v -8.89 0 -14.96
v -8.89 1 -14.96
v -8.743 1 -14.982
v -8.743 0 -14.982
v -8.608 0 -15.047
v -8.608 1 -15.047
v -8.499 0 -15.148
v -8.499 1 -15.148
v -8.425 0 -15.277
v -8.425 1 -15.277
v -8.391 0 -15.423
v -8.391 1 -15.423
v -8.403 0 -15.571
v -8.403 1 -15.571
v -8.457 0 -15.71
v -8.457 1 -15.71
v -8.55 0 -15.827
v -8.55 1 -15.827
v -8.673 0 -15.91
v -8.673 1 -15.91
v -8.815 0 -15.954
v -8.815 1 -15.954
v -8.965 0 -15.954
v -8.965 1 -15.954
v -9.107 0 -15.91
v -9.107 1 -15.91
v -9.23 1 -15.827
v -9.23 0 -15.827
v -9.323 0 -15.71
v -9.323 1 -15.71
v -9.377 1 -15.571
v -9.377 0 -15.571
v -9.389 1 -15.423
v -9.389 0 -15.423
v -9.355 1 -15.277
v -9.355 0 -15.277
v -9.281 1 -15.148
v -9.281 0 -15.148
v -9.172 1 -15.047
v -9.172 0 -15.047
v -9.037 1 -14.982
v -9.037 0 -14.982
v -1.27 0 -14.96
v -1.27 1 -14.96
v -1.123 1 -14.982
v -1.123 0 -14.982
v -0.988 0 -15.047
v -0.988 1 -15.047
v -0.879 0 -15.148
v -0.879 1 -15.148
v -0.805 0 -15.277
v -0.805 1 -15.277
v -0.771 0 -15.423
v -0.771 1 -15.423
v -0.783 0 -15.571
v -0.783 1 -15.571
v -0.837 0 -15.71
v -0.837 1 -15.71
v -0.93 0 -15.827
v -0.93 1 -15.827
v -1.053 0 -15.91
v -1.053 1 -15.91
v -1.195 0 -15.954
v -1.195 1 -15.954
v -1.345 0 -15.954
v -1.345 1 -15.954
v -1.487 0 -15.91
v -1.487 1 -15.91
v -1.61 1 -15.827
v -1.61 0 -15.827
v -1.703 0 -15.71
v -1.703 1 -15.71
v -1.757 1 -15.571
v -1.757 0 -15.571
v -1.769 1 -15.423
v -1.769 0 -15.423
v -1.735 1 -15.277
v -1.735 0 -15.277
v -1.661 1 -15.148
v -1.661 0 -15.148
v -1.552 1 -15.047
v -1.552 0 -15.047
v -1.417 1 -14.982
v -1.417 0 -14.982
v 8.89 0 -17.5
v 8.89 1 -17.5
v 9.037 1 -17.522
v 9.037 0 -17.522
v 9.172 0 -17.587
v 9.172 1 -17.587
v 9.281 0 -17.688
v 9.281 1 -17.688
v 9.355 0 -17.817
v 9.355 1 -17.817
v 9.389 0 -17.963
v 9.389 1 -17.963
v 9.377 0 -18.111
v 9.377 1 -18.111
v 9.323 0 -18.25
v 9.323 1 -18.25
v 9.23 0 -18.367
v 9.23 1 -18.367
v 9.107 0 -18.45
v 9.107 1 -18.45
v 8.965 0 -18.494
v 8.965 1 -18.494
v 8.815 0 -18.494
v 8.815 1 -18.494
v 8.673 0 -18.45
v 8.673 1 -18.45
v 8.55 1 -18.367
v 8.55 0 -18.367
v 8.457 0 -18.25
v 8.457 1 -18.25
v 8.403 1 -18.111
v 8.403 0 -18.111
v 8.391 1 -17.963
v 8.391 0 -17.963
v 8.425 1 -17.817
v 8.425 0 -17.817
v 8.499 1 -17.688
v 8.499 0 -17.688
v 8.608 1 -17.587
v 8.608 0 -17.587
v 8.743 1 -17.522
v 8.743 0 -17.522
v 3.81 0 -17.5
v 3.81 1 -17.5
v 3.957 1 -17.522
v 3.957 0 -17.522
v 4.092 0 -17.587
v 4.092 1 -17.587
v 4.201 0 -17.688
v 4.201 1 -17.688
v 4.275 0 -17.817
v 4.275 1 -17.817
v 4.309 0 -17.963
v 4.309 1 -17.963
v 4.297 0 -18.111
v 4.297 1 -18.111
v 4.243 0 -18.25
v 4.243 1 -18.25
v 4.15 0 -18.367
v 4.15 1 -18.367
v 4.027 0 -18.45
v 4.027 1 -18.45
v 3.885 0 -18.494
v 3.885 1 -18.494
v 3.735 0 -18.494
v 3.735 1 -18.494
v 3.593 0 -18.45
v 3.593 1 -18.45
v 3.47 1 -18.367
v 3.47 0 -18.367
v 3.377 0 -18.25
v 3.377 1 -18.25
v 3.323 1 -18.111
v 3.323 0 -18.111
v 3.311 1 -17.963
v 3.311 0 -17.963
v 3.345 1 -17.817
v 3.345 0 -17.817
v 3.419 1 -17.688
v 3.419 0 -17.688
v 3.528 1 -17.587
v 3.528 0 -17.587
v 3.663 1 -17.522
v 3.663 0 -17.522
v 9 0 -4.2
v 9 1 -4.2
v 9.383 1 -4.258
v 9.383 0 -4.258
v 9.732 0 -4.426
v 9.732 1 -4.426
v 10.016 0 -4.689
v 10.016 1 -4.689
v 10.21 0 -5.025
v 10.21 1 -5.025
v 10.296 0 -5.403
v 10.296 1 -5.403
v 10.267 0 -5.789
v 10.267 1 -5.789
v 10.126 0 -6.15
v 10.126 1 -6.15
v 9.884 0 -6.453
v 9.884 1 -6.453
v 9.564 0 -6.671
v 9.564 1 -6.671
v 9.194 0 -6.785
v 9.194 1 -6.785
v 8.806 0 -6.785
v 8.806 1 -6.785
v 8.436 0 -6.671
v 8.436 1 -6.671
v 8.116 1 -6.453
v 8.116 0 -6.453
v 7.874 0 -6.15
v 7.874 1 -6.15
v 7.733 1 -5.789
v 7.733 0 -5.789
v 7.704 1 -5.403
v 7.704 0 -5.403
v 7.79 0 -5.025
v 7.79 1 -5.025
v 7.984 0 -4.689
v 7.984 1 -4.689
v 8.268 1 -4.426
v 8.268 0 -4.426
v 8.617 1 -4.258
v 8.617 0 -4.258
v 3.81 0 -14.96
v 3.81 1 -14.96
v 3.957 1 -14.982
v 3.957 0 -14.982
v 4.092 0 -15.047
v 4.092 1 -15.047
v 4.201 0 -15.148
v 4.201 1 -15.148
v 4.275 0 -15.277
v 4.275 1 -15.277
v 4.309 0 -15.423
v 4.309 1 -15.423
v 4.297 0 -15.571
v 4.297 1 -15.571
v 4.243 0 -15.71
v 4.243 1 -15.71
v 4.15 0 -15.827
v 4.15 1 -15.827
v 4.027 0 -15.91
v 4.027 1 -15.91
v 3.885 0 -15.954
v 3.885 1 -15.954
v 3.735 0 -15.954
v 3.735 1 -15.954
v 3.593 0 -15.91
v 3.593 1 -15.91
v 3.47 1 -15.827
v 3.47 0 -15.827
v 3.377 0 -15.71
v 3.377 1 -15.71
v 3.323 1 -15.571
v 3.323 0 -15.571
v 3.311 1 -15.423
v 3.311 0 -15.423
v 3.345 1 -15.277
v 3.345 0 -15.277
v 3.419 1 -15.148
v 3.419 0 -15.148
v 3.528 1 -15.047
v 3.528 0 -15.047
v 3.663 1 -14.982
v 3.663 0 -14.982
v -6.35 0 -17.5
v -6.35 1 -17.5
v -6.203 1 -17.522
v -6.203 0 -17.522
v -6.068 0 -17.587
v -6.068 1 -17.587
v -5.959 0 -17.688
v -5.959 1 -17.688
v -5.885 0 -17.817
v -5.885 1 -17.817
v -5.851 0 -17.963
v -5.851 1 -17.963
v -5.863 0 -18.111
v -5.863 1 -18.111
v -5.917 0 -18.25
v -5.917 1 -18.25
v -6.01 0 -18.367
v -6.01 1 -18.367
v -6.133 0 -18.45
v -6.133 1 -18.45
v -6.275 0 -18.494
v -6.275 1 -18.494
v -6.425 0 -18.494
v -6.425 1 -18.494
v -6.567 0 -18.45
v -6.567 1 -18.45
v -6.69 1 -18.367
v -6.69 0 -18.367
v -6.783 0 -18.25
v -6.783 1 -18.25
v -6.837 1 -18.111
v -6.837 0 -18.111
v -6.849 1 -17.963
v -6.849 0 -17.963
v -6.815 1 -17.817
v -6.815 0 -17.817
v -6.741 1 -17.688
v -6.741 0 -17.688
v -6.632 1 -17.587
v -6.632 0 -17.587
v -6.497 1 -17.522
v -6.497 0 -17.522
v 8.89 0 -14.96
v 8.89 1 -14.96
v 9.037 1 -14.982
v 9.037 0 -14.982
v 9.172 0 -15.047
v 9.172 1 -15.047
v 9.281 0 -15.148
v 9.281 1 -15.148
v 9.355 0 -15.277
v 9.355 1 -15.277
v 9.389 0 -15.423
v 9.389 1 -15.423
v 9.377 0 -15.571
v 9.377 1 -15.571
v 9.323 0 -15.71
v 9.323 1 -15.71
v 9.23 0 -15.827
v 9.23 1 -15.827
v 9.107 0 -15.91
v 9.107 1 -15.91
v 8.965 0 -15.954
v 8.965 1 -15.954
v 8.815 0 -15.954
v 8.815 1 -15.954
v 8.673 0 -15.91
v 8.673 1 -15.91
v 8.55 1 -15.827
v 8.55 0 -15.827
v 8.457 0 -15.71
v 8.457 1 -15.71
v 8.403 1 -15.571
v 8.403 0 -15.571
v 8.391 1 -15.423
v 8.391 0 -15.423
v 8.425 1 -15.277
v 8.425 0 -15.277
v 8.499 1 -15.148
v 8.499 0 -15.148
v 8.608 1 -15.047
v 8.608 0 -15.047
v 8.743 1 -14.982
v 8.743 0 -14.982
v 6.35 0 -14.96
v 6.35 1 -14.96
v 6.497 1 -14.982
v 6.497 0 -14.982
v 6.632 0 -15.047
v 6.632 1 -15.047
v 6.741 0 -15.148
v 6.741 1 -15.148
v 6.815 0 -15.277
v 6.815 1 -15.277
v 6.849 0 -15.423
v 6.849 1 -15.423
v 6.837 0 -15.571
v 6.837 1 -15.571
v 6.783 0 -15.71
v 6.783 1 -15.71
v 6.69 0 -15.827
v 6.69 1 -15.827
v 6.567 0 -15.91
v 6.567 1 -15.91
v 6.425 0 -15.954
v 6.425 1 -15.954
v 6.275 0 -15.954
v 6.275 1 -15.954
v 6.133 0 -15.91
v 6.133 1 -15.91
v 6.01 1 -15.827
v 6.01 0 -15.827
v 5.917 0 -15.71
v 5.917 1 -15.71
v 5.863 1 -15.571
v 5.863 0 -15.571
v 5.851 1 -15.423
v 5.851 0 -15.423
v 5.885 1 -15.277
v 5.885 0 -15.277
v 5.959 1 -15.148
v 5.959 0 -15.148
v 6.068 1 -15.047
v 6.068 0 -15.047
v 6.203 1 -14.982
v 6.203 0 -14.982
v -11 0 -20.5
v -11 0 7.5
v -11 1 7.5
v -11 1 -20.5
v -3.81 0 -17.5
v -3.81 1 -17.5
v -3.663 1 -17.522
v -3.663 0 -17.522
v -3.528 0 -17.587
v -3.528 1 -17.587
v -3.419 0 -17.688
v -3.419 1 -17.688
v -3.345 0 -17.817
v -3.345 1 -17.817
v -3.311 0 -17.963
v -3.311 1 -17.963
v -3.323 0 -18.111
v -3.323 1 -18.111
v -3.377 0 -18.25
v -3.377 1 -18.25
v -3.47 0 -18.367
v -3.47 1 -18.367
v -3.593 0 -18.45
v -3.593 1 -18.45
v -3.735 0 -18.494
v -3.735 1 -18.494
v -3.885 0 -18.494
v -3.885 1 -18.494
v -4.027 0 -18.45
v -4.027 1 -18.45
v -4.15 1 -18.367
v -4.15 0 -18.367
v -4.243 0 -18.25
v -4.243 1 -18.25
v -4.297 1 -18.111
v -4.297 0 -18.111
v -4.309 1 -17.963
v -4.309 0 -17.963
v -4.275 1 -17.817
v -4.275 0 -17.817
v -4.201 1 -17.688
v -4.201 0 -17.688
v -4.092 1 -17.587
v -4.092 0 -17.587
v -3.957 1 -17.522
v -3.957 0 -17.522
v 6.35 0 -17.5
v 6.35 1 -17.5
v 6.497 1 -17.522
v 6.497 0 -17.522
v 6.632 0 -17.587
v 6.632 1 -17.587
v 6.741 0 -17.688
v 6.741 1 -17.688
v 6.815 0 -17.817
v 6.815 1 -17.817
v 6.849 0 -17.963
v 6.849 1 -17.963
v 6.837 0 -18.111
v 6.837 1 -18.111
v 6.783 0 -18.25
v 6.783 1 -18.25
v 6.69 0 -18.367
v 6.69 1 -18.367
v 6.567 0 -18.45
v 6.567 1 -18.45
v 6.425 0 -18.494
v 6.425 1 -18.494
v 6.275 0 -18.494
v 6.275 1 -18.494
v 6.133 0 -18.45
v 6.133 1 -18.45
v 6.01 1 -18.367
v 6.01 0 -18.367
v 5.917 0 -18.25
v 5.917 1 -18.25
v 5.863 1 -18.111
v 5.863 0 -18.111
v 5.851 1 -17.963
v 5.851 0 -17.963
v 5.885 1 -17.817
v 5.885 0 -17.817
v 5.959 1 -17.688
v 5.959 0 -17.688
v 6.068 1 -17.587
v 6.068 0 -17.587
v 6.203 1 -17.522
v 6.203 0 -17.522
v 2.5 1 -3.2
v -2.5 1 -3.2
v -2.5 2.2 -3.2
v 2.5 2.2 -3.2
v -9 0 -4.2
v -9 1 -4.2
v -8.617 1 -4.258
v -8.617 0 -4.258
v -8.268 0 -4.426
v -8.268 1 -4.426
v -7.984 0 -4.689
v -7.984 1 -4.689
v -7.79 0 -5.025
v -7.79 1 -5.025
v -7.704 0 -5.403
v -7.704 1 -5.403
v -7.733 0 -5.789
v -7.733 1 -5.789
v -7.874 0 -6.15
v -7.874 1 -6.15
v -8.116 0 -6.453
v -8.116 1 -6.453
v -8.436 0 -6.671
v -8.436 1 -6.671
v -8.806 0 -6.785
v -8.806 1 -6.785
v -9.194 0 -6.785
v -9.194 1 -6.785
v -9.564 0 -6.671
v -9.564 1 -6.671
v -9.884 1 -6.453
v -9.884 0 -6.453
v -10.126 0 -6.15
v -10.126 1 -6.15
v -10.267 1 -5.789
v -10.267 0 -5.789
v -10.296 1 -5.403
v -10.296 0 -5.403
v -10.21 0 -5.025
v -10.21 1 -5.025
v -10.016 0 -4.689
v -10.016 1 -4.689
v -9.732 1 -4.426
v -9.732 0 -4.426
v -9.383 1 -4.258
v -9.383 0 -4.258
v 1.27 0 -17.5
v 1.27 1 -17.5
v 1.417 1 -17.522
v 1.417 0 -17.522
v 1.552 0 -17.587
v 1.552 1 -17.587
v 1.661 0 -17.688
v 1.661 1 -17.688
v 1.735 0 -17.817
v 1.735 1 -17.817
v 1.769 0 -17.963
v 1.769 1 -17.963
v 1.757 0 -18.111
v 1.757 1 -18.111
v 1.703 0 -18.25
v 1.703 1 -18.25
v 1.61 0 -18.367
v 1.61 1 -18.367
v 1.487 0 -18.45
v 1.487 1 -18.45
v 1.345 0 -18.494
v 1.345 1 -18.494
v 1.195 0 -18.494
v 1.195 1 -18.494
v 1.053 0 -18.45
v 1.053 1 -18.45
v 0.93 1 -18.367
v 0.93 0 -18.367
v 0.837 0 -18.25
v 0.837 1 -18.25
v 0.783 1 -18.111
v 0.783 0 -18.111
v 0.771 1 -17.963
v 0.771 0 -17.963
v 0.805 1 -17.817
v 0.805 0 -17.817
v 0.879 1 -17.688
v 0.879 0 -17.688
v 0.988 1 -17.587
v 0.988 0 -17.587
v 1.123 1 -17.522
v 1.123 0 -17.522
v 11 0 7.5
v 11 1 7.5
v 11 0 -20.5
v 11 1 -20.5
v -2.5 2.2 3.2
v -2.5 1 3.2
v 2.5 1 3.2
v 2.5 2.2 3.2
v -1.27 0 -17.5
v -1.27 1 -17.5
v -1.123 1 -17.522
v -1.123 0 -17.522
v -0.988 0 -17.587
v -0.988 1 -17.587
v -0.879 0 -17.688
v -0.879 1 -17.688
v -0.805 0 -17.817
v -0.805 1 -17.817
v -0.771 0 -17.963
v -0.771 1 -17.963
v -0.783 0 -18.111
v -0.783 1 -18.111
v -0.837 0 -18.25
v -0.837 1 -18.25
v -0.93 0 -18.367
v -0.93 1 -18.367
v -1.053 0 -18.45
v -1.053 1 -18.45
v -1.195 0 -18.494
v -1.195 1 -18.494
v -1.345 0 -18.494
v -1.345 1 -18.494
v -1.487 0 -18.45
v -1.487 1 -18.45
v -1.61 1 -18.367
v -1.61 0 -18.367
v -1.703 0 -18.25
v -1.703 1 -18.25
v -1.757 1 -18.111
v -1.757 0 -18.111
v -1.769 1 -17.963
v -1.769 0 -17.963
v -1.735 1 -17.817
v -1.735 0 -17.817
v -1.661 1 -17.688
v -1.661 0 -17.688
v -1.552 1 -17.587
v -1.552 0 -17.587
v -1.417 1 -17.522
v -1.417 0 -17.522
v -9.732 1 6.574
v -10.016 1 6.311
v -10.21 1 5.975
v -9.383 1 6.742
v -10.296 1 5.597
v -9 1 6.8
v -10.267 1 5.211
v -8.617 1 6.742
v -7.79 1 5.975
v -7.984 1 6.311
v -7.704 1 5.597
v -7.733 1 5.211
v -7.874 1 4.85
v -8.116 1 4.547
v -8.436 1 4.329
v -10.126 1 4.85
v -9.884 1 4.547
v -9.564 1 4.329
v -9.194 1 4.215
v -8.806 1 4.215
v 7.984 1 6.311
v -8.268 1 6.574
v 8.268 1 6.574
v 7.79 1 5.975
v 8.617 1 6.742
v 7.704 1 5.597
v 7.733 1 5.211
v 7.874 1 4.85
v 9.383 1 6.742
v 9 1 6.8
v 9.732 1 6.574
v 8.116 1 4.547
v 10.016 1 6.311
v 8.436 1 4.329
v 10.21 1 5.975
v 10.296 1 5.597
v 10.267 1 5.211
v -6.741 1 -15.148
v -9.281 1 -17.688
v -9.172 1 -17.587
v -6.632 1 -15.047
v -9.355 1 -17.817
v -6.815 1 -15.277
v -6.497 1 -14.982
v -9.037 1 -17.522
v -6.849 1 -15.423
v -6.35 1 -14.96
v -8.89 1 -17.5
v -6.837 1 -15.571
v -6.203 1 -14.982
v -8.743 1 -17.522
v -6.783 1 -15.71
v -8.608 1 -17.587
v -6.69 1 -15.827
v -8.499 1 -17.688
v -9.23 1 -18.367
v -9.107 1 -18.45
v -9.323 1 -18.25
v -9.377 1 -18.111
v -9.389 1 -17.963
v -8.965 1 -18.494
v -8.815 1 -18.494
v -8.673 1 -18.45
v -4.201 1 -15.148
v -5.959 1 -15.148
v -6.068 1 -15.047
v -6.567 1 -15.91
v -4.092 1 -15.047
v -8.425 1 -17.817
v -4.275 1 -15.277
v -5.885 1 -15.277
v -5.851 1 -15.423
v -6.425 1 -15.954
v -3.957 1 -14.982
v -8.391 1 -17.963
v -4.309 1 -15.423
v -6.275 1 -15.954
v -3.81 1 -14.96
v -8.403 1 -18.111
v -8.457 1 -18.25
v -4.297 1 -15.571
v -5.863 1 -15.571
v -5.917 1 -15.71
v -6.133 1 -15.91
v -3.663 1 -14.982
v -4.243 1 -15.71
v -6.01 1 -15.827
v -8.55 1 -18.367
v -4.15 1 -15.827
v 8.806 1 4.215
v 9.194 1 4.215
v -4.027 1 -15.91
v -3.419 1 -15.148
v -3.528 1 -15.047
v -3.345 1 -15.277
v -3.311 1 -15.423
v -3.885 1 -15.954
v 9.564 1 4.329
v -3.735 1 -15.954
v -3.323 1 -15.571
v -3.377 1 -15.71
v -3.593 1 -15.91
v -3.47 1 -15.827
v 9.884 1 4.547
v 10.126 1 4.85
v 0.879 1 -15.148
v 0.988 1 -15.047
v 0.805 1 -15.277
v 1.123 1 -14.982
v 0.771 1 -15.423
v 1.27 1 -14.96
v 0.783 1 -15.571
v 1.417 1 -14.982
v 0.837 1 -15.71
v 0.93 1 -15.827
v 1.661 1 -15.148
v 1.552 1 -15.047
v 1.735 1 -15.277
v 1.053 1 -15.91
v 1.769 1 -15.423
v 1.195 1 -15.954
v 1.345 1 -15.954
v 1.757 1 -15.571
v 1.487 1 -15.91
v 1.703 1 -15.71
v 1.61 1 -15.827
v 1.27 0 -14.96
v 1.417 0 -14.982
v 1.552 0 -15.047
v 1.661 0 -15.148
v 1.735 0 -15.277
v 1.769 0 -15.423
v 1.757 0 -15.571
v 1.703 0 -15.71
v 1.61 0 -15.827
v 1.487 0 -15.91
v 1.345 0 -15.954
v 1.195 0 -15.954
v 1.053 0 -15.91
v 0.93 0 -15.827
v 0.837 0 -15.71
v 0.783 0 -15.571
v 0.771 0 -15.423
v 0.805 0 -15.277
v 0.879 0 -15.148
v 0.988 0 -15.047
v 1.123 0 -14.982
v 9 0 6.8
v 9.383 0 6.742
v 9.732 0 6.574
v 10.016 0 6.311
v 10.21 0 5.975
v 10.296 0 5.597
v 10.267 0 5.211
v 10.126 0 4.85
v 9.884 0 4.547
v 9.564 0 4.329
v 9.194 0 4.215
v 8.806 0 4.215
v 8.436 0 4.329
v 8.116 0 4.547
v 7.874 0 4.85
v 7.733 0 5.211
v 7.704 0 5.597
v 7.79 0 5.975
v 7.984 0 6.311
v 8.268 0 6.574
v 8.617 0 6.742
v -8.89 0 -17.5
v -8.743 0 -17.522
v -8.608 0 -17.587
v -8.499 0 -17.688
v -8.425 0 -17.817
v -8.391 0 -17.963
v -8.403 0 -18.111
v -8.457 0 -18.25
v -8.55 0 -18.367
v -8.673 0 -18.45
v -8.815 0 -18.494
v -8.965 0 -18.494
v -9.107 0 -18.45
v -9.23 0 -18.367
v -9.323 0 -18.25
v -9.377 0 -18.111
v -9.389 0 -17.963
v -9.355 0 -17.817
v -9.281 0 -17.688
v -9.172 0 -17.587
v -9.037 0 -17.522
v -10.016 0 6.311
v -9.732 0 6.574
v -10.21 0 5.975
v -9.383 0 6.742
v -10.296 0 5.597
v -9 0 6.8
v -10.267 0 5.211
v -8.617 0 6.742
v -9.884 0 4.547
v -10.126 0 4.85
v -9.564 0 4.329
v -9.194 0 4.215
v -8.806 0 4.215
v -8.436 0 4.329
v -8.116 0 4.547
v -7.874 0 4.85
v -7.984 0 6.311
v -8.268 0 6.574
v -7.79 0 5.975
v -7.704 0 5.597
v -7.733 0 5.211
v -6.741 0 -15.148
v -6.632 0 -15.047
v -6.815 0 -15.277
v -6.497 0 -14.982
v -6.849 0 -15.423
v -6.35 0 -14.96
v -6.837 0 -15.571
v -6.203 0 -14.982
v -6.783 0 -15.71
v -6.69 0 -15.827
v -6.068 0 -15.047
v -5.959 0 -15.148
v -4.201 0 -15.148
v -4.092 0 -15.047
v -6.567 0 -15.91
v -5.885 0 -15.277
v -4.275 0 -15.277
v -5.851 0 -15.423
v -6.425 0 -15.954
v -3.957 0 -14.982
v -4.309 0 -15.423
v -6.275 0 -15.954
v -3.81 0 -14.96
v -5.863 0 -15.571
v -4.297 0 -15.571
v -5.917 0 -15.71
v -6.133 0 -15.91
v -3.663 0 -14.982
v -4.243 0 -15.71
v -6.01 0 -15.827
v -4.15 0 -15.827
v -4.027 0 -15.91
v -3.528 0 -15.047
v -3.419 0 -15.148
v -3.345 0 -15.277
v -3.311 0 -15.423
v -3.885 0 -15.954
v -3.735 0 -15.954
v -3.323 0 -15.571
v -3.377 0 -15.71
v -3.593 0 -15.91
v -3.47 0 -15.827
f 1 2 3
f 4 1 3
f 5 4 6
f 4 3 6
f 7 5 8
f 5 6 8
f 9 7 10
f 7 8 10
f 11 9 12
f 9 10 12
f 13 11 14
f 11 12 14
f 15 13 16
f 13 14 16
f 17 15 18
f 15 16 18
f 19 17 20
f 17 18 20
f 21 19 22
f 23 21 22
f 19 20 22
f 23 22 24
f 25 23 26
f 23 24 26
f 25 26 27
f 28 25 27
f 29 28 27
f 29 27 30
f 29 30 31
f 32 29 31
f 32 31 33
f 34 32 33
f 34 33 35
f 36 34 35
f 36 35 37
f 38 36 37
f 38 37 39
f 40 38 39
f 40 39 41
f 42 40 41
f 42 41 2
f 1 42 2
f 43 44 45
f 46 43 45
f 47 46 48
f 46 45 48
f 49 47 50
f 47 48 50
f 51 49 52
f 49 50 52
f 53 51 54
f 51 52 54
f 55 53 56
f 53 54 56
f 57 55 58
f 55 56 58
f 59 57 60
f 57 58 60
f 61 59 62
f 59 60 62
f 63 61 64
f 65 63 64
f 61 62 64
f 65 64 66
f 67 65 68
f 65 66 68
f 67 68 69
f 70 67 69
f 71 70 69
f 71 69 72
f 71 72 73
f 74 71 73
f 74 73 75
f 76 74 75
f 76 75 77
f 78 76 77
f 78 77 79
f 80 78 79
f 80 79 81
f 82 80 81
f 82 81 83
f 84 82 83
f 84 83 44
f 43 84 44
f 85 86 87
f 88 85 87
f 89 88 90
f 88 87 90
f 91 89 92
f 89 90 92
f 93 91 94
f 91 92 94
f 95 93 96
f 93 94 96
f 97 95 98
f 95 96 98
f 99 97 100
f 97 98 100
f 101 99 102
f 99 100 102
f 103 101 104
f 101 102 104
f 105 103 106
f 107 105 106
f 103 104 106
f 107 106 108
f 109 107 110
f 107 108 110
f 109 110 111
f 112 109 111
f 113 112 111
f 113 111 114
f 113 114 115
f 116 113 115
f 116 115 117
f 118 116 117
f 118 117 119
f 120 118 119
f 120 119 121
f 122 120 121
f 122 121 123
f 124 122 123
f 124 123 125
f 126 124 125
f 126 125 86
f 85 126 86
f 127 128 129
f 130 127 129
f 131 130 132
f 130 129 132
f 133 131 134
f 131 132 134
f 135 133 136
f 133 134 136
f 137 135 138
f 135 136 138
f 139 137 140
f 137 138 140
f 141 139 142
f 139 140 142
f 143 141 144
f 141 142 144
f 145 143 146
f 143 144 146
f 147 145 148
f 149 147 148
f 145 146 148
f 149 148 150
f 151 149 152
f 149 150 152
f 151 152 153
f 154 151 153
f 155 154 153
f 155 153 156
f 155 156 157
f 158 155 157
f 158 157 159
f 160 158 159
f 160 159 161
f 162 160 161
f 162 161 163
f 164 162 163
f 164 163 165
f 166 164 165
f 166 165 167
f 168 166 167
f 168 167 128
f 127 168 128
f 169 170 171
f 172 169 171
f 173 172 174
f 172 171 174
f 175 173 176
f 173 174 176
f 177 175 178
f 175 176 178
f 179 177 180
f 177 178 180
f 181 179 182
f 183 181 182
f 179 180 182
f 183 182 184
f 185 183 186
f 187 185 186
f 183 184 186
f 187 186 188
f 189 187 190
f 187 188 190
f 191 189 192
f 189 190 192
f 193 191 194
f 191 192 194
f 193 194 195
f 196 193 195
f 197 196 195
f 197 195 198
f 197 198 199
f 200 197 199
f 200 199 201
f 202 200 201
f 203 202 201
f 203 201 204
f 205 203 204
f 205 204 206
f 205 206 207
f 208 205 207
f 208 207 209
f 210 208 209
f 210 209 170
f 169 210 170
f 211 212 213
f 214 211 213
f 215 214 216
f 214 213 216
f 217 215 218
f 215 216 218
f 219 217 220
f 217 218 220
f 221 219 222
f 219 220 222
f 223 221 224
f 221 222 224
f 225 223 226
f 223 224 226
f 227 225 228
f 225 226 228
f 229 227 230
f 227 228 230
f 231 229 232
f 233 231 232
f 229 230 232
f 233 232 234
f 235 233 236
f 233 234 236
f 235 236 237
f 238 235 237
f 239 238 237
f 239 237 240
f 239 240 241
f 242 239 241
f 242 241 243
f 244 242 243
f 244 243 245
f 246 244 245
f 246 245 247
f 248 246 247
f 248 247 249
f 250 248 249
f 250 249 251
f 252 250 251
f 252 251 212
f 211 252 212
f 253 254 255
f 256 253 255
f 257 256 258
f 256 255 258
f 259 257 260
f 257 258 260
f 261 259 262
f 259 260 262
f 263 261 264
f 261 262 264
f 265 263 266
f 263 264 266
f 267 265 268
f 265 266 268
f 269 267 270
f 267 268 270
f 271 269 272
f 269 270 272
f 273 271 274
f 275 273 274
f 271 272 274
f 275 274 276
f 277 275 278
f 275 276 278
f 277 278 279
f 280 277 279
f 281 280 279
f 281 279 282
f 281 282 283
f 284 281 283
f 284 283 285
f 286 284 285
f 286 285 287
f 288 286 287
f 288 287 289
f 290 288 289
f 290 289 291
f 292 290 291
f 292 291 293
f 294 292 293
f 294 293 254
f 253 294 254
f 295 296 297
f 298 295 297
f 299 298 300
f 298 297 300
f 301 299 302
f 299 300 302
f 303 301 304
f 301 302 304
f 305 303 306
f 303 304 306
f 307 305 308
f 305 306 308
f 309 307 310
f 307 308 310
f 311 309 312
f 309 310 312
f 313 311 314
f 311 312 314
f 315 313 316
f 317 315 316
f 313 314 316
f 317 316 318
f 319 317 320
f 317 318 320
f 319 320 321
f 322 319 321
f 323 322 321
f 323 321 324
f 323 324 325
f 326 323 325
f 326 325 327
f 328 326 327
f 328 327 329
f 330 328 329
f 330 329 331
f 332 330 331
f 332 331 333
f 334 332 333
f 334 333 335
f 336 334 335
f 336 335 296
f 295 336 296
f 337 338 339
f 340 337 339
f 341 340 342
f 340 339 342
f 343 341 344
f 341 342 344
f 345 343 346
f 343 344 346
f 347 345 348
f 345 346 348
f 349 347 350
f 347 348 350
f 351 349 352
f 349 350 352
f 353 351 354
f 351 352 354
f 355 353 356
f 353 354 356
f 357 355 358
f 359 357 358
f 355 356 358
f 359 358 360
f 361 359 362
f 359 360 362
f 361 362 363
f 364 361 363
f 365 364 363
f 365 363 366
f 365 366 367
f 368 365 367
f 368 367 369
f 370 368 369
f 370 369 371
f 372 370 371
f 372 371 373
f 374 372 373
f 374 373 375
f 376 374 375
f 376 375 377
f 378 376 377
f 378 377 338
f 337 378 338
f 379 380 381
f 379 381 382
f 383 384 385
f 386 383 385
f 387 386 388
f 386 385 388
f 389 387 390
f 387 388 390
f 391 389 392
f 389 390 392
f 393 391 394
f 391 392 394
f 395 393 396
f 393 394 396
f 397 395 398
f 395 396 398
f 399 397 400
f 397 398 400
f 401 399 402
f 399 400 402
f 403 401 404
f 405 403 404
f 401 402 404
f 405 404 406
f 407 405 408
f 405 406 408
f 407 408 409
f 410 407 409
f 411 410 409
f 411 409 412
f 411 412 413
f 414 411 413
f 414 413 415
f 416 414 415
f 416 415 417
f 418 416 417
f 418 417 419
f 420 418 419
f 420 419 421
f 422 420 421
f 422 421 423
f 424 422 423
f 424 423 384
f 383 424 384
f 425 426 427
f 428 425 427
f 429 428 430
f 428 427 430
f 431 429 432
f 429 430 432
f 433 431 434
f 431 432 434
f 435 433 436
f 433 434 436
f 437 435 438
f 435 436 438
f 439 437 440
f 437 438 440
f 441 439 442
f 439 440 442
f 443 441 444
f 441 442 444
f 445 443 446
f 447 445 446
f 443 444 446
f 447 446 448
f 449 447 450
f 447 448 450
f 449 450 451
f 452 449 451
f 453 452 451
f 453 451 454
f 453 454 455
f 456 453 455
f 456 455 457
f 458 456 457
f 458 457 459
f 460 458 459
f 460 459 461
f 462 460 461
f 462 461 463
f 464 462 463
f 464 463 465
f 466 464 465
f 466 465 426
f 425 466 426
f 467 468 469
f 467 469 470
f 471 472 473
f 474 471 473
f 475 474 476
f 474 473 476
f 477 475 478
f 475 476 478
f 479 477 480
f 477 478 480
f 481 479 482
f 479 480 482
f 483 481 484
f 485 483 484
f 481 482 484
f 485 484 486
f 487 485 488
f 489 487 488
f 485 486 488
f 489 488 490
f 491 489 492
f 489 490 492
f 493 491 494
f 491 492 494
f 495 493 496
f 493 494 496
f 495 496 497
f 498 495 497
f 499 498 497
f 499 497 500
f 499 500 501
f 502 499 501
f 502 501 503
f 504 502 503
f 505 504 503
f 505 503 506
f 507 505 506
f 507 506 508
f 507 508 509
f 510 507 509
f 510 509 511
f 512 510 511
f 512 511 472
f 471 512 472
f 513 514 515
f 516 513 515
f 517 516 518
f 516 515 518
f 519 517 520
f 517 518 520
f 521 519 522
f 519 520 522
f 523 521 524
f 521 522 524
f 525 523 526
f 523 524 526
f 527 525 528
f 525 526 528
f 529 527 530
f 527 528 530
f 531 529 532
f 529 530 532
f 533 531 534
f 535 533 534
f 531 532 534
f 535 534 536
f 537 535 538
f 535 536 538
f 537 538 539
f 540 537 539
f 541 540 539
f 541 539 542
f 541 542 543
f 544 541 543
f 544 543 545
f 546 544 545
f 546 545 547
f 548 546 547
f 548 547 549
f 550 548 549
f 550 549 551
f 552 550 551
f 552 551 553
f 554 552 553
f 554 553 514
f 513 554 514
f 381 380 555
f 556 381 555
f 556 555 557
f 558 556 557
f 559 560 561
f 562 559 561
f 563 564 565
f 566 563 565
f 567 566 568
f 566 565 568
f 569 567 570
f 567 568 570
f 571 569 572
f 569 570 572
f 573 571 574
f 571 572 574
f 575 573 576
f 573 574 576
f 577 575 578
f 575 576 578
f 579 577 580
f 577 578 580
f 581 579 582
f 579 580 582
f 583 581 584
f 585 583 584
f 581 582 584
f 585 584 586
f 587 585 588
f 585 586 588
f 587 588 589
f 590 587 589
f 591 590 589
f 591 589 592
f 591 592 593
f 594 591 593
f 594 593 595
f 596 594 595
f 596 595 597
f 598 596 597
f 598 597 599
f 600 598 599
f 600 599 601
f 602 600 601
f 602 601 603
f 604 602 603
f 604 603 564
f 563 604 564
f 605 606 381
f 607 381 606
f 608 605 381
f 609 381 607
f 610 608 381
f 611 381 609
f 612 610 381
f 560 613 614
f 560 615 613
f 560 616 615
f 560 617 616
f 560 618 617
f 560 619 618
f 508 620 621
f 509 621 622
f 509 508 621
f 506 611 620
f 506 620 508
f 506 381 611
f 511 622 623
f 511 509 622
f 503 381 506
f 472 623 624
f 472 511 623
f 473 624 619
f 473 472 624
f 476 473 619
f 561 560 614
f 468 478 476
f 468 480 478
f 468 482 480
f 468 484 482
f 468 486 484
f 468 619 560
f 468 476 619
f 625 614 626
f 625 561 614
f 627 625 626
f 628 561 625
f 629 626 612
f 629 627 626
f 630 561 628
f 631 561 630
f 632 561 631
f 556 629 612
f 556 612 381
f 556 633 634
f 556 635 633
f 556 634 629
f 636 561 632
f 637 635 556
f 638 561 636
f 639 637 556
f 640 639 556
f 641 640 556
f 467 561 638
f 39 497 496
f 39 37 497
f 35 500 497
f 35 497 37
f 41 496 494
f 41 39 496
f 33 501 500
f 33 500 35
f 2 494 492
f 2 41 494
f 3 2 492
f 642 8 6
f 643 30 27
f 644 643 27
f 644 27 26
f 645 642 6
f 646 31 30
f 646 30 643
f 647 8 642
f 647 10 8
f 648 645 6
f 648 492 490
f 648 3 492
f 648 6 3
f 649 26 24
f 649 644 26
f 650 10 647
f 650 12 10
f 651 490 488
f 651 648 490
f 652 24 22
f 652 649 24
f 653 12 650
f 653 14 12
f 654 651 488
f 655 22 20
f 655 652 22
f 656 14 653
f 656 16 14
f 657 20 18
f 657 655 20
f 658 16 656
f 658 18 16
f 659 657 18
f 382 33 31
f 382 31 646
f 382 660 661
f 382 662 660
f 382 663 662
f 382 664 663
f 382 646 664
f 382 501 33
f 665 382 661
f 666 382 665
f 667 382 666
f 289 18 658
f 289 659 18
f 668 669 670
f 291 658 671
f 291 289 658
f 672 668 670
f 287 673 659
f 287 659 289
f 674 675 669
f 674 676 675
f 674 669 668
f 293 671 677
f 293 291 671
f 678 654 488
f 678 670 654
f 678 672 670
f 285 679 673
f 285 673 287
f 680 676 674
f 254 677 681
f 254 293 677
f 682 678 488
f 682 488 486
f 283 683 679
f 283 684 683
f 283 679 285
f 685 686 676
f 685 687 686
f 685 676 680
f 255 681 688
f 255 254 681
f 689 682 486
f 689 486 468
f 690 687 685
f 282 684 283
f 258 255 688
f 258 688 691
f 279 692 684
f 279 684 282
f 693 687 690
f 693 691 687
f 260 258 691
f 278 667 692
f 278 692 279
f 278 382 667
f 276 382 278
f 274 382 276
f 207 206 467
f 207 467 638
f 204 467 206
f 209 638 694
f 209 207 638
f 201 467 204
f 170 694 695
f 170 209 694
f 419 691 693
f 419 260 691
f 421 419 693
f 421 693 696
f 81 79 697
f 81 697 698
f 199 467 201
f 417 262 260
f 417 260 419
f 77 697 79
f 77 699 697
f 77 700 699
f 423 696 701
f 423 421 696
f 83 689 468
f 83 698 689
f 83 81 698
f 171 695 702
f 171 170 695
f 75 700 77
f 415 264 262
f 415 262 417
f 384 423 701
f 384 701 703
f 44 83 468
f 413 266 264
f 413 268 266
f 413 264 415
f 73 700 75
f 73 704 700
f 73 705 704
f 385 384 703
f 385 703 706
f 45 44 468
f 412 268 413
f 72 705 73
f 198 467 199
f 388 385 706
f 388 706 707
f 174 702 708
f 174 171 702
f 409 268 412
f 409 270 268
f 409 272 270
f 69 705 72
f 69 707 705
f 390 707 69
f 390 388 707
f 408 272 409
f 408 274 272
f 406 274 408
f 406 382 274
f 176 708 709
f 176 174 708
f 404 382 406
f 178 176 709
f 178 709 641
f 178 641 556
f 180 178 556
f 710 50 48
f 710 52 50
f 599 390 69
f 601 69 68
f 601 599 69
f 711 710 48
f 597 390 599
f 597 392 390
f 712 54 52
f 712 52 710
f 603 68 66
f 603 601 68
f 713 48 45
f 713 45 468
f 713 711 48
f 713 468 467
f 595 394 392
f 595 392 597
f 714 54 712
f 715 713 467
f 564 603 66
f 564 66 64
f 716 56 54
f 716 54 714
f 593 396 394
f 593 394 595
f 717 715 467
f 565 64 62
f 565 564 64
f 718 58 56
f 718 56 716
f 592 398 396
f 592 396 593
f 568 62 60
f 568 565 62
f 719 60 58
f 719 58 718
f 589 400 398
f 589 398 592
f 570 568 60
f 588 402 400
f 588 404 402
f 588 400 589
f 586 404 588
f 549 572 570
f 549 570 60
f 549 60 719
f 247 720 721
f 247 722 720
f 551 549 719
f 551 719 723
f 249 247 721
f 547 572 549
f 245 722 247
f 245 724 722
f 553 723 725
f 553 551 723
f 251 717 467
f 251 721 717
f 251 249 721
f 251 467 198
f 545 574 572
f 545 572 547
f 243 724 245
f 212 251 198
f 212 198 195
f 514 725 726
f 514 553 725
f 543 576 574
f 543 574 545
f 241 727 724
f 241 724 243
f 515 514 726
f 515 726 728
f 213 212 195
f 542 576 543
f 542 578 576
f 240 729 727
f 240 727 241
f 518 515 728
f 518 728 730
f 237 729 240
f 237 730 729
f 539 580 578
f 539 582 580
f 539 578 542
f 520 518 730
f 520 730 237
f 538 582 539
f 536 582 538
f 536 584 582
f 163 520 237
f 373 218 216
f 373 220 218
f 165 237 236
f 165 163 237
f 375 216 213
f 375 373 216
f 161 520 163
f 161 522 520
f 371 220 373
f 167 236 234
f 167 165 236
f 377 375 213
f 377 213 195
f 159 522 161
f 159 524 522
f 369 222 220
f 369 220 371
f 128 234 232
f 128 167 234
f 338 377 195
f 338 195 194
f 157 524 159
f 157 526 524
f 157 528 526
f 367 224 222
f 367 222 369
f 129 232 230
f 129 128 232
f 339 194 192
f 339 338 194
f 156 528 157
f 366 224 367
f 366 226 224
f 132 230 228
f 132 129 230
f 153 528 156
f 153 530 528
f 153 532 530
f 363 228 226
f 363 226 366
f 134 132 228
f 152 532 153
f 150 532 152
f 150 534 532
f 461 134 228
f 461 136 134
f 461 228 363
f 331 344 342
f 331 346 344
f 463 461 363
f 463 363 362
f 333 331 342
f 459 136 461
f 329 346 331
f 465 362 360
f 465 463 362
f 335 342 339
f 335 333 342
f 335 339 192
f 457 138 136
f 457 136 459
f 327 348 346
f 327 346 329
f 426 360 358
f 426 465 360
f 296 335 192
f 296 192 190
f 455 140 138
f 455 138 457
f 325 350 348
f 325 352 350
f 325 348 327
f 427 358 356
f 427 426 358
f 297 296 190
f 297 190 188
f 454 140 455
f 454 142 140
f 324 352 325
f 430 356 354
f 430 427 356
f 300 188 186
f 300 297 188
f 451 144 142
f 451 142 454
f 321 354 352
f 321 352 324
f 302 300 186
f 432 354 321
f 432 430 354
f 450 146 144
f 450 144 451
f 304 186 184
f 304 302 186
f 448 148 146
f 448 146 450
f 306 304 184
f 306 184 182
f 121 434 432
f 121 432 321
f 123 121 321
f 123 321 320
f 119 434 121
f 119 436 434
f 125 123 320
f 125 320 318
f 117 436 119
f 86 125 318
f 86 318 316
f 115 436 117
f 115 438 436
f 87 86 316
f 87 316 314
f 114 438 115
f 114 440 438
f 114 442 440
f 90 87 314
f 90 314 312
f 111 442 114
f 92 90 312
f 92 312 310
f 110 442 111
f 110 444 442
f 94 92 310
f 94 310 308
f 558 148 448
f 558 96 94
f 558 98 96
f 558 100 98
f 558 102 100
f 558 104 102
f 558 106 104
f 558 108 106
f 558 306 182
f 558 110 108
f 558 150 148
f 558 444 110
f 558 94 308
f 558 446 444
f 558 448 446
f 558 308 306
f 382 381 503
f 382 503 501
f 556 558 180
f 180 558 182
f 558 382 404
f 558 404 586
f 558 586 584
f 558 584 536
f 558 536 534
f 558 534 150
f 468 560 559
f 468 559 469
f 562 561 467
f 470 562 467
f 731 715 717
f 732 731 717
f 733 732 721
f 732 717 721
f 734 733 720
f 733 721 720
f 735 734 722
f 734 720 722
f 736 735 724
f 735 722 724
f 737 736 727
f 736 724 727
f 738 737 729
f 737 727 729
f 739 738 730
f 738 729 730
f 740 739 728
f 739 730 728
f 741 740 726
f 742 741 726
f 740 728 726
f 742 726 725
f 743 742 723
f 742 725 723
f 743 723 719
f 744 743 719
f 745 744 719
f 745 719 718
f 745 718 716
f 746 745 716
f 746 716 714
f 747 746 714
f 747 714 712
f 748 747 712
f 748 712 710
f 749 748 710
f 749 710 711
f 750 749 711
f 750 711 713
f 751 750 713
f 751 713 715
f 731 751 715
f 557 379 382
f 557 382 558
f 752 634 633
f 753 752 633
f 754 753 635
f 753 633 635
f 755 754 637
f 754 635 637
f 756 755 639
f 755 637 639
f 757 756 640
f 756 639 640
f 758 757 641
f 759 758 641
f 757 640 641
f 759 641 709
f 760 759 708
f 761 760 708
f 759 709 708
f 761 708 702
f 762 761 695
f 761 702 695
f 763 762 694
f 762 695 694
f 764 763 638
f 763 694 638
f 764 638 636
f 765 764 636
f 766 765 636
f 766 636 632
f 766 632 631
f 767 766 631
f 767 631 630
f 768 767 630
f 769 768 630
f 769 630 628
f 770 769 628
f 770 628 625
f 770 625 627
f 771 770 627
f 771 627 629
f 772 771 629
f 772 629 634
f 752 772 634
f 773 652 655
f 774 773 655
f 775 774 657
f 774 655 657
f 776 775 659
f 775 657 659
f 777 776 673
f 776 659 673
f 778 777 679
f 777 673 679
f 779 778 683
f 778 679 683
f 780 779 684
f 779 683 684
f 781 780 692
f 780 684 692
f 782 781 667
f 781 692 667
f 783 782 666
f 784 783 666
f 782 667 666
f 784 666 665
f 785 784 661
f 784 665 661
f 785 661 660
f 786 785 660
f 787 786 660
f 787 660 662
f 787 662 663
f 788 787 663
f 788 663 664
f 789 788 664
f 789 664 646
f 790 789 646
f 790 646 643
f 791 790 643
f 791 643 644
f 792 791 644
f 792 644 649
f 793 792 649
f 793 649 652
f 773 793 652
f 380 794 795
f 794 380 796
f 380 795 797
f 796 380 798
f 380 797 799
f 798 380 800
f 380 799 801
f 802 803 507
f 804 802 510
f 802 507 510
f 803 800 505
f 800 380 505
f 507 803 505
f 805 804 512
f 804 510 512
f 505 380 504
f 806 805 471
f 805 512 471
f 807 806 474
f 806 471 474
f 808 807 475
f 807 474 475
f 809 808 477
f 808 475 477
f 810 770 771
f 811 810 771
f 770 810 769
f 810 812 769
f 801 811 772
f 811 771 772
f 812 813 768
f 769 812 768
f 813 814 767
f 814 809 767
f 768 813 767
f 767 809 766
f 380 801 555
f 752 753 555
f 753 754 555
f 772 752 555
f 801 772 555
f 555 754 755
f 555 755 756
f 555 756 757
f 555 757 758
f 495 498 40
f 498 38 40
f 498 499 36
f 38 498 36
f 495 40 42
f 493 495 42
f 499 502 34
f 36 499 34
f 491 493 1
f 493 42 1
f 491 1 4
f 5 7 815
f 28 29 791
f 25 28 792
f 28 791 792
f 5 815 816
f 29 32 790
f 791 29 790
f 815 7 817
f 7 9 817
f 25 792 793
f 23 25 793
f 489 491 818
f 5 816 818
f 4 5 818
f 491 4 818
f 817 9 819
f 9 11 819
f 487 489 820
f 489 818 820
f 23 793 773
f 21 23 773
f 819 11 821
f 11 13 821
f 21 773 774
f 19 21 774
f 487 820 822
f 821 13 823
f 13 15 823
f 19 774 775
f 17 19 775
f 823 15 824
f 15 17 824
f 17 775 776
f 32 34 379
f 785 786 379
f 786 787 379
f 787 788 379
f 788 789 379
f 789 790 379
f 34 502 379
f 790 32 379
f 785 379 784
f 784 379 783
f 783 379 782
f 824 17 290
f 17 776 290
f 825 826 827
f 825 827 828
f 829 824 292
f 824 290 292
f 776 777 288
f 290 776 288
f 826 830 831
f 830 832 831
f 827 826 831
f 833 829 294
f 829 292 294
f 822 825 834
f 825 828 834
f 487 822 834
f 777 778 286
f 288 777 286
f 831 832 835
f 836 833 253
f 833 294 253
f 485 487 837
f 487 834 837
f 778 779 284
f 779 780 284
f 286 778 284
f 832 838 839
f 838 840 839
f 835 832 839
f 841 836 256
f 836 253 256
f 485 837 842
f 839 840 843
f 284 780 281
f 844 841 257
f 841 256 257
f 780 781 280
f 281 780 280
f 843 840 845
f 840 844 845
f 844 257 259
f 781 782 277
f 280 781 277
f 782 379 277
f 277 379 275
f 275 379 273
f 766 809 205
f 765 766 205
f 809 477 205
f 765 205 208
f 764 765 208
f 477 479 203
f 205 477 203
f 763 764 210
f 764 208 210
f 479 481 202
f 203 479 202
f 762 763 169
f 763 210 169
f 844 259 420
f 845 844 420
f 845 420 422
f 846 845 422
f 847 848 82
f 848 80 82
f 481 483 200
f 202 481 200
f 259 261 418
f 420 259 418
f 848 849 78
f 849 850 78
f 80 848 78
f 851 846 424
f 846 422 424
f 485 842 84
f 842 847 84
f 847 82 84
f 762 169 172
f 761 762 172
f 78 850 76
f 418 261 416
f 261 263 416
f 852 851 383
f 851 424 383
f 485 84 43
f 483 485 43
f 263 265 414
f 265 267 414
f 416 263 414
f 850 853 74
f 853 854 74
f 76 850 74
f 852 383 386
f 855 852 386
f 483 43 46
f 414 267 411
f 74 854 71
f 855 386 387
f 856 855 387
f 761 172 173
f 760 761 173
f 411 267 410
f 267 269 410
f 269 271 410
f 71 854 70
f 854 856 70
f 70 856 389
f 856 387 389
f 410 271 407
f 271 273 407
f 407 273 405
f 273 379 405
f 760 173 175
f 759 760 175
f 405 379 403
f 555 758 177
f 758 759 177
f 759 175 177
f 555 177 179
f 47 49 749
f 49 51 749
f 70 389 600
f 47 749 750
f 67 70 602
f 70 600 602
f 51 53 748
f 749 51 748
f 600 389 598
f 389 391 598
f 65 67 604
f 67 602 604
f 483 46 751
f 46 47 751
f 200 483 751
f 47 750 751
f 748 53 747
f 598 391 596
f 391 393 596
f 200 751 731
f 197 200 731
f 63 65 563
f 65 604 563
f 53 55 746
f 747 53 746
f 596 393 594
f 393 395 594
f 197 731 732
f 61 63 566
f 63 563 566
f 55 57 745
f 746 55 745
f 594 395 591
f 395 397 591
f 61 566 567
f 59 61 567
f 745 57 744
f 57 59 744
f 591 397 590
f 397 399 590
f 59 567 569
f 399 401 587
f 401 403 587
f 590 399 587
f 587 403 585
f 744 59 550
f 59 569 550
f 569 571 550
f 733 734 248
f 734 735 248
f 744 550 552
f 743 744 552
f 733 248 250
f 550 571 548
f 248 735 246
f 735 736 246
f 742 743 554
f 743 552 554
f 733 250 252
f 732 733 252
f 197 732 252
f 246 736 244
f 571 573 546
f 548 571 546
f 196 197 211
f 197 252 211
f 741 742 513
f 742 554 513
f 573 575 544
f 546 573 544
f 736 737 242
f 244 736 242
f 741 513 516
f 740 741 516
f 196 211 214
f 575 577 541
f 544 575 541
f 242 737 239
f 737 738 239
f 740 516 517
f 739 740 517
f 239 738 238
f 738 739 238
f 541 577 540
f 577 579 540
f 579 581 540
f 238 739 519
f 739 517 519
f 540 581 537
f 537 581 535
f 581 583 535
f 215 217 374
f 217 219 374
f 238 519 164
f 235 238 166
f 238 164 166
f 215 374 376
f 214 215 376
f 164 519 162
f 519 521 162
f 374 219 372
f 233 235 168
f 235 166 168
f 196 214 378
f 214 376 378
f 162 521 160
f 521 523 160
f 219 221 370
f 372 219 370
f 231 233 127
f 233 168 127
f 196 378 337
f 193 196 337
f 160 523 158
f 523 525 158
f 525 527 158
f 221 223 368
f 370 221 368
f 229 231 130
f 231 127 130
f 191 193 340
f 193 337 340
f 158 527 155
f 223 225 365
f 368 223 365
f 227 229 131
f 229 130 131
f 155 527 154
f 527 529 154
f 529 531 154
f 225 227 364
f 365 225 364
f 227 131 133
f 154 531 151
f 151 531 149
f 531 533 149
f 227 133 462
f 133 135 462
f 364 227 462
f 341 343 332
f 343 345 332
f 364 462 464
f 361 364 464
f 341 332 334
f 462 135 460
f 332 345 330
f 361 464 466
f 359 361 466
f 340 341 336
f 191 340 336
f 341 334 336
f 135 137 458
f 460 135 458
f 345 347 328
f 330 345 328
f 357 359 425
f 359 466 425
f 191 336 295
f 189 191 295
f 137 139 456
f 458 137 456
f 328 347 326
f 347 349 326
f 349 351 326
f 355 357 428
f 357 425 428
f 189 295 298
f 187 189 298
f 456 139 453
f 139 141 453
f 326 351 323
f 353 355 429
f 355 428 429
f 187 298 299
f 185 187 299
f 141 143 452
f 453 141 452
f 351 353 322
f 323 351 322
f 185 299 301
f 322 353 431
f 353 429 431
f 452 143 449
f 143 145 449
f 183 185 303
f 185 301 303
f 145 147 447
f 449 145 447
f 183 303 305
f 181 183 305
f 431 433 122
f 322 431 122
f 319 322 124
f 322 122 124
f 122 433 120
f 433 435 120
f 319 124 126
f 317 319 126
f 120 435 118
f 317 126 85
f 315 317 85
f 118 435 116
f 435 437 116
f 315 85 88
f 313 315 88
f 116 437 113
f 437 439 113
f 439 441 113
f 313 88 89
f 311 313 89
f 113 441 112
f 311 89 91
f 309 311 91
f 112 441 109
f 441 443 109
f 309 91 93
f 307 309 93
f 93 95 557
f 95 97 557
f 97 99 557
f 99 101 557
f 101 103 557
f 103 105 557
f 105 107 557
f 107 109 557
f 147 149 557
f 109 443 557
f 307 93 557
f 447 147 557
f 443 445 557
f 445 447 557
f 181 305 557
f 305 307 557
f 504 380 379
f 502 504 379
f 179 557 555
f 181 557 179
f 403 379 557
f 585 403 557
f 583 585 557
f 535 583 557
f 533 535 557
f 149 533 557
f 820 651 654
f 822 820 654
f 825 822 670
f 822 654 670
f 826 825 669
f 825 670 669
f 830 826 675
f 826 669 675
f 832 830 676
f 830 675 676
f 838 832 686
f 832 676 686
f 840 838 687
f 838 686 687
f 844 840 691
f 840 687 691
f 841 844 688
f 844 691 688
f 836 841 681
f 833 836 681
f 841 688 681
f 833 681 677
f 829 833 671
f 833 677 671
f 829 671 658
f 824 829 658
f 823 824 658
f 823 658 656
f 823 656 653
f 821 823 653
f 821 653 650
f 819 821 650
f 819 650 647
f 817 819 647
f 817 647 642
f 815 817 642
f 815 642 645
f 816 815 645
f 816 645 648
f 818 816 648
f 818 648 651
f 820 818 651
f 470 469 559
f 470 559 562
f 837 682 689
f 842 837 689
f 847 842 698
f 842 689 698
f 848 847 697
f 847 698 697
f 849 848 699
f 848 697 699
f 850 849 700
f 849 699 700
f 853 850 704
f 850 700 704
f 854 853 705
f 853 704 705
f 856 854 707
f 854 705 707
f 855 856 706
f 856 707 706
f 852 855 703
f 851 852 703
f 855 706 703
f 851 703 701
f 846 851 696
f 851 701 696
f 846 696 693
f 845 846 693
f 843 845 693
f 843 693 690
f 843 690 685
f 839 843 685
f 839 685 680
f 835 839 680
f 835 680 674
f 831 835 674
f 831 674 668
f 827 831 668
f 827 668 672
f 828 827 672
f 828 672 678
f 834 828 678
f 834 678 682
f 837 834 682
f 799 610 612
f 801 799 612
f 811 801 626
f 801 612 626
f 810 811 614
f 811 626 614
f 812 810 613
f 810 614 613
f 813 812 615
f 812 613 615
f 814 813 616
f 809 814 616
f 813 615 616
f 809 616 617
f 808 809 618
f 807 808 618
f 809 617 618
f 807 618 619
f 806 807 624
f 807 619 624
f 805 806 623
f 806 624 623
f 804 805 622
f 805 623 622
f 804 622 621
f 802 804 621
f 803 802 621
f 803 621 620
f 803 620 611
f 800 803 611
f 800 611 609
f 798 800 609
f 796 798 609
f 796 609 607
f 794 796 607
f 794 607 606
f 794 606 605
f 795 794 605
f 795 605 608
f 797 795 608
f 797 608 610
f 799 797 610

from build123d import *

# Parameters (mm, degrees)
SKETCH1_W           = 22
SKETCH1_H           = 28
BOSS_EXTRUDE1_DEPTH = 1
SKETCH2_R           = 1.3
CUT_EXTRUDE8_DEPTH  = 24.286262044
SKETCH3_W           = 5
SKETCH3_H           = 6.4
IC_DEPTH            = 1.2
SKETCH4_R           = 0.5
CUT_EXTRUDE9_DEPTH  = 24.368568634


with BuildPart() as part:
    # Sketch1 → Boss-Extrude1 (new body)
    with BuildSketch(Plane(origin=(0, 0, 0), x_dir=(1, 0, 0), z_dir=(0, 1, 0))):
        with Locations((0, 6.5)):
            Rectangle(SKETCH1_W, SKETCH1_H)
    extrude(amount=BOSS_EXTRUDE1_DEPTH)

    # Sketch2 → Cut-Extrude8 (cut, through all)
    with BuildSketch(Plane(origin=(0, 1, 0), x_dir=(1, 0, 0), z_dir=(0, 1, 0))):
        with Locations(Location((-9, -5.5, 0), (0, 0, 270))):
            Circle(SKETCH2_R)
        with Locations(Location((9, -5.5, 0), (0, 0, 270))):
            Circle(SKETCH2_R)
        with Locations(Location((9, 5.5, 0), (0, 0, 270))):
            Circle(SKETCH2_R)
        with Locations(Location((-9, 5.5, 0), (0, 0, 270))):
            Circle(SKETCH2_R)
    extrude(amount=-CUT_EXTRUDE8_DEPTH, mode=Mode.SUBTRACT)

    # Sketch3 → IC (add)
    with BuildSketch(Plane(origin=(0, 1, 0), x_dir=(1, 0, 0), z_dir=(0, 1, 0))):
        Rectangle(SKETCH3_W, SKETCH3_H)
    extrude(amount=IC_DEPTH)

    # Sketch4 → Cut-Extrude9 (cut, through all)
    with BuildSketch(Plane(origin=(0, 2.2, 0), x_dir=(1, 0, 0), z_dir=(0, 1, 0))):
        with Locations(Location((-8.89, 15.46, 0), (0, 0, 270))):
            Circle(SKETCH4_R)
        with Locations(Location((-6.35, 15.46, 0), (0, 0, 270))):
            Circle(SKETCH4_R)
        with Locations(Location((-3.81, 15.46, 0), (0, 0, 270))):
            Circle(SKETCH4_R)
        with Locations(Location((-1.27, 15.46, 0), (0, 0, 270))):
            Circle(SKETCH4_R)
        with Locations(Location((1.27, 15.46, 0), (0, 0, 270))):
            Circle(SKETCH4_R)
        with Locations(Location((3.81, 15.46, 0), (0, 0, 270))):
            Circle(SKETCH4_R)
        with Locations(Location((6.35, 15.46, 0), (0, 0, 270))):
            Circle(SKETCH4_R)
        with Locations(Location((8.89, 15.46, 0), (0, 0, 270))):
            Circle(SKETCH4_R)
        with Locations(Location((-6.35, 18, 0), (0, 0, 270))):
            Circle(SKETCH4_R)
        with Locations(Location((-3.81, 18, 0), (0, 0, 270))):
            Circle(SKETCH4_R)
        with Locations(Location((-1.27, 18, 0), (0, 0, 270))):
            Circle(SKETCH4_R)
        with Locations(Location((1.27, 18, 0), (0, 0, 270))):
            Circle(SKETCH4_R)
        with Locations(Location((3.81, 18, 0), (0, 0, 270))):
            Circle(SKETCH4_R)
        with Locations(Location((6.35, 18, 0), (0, 0, 270))):
            Circle(SKETCH4_R)
        with Locations(Location((8.89, 18, 0), (0, 0, 270))):
            Circle(SKETCH4_R)
        with Locations(Location((-8.89, 18, 0), (0, 0, 270))):
            Circle(SKETCH4_R)
    extrude(amount=-CUT_EXTRUDE9_DEPTH, mode=Mode.SUBTRACT)


solid = part.part
